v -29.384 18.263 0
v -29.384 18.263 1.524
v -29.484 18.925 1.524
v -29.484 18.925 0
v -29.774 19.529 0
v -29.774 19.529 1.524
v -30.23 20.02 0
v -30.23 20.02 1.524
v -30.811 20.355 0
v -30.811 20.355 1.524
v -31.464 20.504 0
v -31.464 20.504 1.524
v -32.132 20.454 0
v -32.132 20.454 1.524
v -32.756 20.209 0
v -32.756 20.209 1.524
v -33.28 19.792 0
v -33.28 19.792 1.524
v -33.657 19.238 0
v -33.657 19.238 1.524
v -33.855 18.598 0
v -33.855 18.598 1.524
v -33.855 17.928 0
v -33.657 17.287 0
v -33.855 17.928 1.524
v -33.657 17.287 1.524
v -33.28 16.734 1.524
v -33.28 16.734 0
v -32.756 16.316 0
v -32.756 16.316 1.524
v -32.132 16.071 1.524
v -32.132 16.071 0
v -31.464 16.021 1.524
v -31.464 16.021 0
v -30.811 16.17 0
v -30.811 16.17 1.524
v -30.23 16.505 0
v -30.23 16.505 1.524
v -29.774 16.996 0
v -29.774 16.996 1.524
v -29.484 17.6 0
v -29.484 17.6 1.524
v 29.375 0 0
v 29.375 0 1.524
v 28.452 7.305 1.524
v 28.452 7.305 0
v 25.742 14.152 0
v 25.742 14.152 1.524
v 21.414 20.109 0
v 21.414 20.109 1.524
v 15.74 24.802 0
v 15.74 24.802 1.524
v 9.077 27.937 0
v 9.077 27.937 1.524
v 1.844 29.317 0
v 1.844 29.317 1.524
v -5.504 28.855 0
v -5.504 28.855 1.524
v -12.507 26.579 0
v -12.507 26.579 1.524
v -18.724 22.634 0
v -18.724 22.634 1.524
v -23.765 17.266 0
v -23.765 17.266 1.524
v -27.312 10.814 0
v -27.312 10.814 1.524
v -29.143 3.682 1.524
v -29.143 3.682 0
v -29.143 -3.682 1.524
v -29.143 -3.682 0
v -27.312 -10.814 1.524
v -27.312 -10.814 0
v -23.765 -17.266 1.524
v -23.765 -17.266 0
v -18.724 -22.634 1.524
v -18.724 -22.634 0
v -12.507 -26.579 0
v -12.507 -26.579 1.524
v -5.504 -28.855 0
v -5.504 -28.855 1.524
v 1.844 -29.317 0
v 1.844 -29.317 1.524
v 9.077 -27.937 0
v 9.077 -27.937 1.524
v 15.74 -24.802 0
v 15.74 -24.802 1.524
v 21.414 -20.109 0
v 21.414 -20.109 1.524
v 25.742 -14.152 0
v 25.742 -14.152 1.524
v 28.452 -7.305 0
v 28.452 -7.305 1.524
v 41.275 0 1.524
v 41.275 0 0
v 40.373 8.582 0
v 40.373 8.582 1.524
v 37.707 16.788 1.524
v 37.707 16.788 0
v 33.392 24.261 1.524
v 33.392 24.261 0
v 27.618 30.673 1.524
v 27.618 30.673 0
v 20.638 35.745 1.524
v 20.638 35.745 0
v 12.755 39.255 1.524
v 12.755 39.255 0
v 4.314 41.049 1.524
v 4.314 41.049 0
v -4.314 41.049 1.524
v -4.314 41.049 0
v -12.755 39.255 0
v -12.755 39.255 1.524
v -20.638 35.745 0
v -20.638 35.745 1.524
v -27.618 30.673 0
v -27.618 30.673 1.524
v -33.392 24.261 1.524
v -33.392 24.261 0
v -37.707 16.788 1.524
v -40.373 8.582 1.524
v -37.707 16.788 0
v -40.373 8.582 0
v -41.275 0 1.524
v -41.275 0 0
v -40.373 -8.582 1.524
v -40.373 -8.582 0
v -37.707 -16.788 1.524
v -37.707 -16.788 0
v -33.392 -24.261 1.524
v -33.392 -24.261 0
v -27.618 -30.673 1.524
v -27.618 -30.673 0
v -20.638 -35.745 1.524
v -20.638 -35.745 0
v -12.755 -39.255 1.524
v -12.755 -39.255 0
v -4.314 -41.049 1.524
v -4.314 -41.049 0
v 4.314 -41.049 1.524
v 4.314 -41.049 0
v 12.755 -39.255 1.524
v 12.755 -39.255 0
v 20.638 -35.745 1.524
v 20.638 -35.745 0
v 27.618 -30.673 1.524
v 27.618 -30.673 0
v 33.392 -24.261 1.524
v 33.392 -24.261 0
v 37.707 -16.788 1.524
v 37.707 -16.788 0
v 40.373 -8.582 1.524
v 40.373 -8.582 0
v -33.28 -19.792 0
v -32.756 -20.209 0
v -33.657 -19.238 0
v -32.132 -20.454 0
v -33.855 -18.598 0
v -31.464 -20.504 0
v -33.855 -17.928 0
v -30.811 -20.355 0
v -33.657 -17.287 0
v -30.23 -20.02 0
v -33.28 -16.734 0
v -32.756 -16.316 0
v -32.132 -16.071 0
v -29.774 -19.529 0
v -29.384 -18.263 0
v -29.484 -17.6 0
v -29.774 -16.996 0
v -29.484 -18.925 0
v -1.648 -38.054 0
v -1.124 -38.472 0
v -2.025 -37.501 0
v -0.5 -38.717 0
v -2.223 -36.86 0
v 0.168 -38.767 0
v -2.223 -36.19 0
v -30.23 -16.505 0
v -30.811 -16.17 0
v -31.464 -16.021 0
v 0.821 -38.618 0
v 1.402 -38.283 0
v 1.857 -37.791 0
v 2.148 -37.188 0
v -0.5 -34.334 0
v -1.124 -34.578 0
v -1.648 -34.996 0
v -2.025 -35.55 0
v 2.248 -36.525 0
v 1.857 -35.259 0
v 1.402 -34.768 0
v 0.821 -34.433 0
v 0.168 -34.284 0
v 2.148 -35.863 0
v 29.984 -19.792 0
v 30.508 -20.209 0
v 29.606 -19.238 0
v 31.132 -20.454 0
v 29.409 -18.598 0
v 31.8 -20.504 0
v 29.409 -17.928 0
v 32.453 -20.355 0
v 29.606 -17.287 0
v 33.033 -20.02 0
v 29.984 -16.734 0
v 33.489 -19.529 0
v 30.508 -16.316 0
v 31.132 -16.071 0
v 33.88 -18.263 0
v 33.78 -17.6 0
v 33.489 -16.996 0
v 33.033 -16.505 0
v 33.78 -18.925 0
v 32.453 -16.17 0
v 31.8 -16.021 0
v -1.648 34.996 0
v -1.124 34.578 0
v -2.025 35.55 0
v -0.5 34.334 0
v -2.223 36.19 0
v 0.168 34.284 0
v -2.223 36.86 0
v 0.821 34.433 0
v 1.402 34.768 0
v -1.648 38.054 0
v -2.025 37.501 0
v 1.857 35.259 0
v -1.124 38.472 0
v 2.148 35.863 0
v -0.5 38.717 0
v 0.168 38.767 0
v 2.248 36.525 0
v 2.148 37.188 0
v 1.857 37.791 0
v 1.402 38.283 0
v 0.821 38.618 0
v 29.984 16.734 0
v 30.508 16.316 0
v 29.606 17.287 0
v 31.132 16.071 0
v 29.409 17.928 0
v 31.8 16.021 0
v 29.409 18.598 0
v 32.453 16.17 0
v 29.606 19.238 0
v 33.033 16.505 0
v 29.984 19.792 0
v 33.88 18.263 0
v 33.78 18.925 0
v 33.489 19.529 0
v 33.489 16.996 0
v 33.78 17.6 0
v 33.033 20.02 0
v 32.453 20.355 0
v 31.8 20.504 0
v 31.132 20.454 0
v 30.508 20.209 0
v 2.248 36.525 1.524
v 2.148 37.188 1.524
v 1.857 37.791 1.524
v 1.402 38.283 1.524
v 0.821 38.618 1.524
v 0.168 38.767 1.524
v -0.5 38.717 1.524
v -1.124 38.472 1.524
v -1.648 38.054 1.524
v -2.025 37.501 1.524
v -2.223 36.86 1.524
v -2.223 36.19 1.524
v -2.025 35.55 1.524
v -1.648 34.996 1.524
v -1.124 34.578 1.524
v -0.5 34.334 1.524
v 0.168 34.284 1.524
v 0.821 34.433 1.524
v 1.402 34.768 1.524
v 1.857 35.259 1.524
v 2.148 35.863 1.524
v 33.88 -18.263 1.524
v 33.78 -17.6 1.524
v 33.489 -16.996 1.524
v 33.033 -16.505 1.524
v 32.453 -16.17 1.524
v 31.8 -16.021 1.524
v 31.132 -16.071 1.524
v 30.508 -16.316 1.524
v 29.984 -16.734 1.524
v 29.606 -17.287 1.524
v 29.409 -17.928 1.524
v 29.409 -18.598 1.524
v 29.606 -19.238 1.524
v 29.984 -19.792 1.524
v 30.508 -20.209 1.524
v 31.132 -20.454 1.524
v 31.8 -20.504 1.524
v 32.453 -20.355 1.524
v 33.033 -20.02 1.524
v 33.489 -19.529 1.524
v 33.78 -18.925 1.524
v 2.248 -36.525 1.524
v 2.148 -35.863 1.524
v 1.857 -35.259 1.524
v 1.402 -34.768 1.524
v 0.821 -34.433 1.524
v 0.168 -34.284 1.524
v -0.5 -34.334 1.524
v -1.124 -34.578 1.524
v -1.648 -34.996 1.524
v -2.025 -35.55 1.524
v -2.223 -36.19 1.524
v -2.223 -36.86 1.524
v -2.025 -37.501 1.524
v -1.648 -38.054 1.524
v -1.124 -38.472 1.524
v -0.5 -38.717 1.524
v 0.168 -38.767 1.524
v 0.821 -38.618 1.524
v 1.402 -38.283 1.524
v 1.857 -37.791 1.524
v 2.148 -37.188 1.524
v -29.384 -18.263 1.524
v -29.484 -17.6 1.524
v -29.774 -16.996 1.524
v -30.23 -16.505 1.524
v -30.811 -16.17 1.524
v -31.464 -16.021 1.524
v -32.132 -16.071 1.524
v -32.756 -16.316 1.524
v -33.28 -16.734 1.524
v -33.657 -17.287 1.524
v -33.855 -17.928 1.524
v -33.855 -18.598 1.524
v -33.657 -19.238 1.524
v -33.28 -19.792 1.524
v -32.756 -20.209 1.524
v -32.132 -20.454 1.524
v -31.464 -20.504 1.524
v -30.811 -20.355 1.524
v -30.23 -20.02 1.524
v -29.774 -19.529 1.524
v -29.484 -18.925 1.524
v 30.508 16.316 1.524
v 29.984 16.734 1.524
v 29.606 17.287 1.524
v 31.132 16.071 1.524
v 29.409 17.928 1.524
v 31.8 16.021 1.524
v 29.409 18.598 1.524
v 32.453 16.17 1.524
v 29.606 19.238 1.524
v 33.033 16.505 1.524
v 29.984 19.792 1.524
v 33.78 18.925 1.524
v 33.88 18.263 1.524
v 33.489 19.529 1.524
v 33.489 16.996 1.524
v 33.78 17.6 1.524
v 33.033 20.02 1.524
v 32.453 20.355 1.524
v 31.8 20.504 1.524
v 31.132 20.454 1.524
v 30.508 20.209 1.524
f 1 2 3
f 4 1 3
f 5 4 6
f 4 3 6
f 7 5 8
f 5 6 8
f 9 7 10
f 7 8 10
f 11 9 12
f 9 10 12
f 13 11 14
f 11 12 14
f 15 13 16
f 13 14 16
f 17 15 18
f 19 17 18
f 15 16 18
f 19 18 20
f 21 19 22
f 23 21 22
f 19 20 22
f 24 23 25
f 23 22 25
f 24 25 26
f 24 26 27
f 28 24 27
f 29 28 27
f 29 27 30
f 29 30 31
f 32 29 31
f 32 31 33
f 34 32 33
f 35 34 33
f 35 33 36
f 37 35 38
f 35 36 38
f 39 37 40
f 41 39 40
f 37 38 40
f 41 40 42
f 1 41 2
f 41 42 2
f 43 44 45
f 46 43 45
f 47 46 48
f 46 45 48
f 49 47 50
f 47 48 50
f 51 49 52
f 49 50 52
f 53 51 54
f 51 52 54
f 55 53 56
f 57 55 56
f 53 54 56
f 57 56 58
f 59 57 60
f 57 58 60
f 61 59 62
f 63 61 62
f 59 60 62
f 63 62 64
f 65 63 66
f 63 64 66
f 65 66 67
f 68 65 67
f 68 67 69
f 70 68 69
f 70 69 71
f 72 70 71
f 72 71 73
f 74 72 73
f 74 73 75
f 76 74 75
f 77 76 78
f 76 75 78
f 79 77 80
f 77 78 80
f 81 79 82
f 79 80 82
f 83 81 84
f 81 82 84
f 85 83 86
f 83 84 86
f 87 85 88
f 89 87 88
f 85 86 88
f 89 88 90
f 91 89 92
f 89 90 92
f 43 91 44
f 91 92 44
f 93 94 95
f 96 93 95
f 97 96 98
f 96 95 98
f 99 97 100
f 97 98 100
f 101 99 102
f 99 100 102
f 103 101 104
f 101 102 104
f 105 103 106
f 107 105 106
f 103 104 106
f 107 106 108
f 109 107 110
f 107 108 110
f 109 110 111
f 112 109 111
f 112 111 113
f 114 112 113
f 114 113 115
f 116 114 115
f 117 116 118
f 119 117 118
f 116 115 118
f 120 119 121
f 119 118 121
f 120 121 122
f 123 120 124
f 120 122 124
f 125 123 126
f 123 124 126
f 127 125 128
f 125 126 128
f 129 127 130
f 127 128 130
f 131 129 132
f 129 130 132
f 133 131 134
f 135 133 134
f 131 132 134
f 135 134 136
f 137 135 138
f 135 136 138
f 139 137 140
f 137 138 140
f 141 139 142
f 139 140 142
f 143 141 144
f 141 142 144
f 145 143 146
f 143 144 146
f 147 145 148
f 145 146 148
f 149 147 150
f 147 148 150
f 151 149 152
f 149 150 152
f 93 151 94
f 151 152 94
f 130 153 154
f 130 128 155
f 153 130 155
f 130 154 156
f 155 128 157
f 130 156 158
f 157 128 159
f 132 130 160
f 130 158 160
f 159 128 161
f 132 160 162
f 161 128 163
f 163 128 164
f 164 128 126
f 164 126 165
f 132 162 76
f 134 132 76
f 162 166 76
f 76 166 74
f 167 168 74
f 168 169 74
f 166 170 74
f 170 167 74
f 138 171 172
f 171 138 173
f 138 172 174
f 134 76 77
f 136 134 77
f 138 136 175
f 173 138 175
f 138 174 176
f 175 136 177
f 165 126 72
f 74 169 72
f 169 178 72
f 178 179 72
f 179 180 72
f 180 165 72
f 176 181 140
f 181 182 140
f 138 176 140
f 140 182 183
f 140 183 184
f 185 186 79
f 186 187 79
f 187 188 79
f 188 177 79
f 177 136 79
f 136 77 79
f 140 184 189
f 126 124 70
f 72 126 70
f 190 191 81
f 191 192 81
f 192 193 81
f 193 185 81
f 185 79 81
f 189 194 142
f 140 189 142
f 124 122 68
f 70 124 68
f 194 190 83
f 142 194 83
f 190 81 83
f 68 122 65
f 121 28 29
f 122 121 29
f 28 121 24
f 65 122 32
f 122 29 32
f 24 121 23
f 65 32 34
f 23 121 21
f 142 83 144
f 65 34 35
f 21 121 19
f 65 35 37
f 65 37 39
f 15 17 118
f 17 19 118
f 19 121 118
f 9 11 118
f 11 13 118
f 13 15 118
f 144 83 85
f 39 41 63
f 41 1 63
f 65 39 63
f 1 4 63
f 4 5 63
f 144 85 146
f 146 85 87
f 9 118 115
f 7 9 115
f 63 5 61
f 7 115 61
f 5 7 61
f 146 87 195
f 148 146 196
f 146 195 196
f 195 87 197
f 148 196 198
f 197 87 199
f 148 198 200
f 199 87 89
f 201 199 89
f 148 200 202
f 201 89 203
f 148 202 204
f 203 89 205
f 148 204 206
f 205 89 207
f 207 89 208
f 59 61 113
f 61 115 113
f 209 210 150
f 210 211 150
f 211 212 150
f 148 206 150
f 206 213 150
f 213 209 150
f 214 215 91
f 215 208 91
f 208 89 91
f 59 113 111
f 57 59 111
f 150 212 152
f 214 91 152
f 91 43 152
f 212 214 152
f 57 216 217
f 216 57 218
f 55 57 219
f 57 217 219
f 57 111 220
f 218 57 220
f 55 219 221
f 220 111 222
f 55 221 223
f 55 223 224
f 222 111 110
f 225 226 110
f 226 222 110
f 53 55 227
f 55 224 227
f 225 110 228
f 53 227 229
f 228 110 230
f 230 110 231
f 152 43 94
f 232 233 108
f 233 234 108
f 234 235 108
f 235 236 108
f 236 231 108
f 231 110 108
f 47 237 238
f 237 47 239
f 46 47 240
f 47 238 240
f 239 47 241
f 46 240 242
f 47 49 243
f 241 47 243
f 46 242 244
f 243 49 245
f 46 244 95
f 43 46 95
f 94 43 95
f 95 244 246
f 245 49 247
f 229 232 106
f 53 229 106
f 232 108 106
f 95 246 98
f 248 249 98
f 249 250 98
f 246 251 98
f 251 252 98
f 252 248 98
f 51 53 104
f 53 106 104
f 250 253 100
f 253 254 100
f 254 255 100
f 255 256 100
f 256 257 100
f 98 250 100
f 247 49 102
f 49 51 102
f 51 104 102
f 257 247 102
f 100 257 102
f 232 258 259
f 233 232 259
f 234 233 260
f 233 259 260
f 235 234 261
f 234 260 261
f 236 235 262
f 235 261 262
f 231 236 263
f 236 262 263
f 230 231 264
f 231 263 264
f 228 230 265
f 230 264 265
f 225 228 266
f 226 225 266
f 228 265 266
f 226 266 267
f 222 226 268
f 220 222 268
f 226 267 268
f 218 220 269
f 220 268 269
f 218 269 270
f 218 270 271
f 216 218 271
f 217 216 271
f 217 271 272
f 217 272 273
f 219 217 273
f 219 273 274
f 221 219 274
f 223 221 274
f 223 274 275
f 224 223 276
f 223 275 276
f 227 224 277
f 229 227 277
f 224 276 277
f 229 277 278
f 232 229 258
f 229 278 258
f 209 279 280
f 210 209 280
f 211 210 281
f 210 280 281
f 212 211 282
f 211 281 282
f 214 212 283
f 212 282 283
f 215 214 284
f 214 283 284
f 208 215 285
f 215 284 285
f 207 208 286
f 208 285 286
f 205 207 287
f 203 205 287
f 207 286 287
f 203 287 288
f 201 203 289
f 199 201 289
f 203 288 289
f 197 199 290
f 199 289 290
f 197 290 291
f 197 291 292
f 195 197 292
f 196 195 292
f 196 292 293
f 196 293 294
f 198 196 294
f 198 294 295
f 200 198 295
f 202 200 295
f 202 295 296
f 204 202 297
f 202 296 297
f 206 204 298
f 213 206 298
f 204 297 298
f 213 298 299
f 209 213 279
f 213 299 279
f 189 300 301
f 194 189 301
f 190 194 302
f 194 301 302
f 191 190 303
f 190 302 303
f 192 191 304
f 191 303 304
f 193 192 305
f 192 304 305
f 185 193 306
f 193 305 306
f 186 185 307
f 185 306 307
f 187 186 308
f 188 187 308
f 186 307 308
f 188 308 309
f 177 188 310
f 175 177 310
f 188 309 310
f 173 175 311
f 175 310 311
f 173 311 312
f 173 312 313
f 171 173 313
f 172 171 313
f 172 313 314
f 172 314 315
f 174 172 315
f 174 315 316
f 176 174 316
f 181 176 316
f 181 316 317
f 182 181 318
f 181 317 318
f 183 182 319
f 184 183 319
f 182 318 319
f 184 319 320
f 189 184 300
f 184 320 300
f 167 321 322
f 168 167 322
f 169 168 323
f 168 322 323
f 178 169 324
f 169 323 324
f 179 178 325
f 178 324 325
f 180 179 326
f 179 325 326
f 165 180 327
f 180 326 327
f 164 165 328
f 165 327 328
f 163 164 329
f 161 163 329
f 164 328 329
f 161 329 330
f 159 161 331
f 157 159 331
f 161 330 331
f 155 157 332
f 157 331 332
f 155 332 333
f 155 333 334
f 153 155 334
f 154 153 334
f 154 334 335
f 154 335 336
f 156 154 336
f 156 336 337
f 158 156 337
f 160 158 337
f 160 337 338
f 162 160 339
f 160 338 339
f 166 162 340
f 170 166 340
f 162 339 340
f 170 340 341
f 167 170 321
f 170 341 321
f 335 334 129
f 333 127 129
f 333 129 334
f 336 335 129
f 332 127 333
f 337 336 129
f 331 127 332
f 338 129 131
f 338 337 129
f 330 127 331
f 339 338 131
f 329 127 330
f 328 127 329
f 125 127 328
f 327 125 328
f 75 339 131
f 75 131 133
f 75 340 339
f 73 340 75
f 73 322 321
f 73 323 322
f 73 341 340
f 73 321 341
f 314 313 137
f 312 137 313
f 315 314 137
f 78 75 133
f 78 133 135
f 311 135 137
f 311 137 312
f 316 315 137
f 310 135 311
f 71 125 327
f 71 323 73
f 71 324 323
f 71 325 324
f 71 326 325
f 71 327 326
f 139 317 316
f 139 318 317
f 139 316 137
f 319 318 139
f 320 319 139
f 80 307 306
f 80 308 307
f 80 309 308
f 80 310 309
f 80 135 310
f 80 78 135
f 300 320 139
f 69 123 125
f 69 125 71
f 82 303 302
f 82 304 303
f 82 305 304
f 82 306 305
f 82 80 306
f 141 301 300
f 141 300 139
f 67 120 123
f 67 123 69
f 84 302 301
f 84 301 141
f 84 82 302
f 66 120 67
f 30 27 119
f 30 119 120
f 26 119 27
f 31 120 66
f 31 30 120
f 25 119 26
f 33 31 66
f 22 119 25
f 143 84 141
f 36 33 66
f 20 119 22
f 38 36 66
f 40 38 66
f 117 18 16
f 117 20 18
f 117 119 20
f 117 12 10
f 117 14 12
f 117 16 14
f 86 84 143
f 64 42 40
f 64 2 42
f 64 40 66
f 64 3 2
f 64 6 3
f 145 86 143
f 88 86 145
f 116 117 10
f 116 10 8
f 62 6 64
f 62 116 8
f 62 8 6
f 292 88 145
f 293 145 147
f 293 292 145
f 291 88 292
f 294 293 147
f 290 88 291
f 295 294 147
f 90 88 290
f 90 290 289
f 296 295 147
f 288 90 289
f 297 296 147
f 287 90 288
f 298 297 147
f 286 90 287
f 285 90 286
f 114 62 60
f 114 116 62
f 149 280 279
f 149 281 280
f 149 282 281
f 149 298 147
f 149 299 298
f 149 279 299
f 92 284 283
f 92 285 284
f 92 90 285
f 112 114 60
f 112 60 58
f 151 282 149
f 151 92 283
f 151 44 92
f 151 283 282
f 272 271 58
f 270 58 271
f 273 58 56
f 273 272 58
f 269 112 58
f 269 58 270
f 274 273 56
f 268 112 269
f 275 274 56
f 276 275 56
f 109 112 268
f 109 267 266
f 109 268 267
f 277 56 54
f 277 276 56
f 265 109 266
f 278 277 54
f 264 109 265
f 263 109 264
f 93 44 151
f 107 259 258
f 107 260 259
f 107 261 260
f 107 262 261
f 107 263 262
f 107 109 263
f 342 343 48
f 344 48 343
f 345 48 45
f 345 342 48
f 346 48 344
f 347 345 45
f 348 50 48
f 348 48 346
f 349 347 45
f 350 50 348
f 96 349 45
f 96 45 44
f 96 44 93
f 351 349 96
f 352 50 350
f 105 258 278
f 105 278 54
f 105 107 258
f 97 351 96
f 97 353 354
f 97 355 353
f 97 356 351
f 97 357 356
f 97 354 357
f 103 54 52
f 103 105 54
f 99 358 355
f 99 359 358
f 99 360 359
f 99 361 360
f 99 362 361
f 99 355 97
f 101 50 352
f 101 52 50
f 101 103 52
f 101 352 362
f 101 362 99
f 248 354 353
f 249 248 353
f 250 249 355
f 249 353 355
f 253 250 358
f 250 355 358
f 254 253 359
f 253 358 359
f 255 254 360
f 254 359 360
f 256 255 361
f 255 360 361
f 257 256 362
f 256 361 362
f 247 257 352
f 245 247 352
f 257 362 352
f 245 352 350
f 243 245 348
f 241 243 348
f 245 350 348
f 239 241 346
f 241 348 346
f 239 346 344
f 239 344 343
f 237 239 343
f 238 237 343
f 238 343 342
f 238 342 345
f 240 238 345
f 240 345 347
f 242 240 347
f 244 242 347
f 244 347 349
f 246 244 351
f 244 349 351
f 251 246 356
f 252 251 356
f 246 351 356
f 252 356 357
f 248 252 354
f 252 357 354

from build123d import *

# Parameters (mm, degrees)
F0_R     = 41.275
F1_DEPTH = 1.524
F2_R     = 2.2479
F3_DEPTH = 1.524
F4_R     = 29.3751
F5_DEPTH = 1.524


with BuildPart() as f1:
    # F0 (on Top) → F1 (new body)
    with BuildSketch(Plane.XY):
        Circle(F0_R)
    extrude(amount=F1_DEPTH)

    # F2 (on face) → F3 (cut, through all)
    with BuildSketch(Plane.XY.offset(1.524)):
        with Locations((0, 36.5252)):
            Circle(F2_R)
        with Locations((-31.631751, 18.2626)):
            Circle(F2_R)
        with Locations((-31.631751, -18.2626)):
            Circle(F2_R)
        with Locations((0, -36.5252)):
            Circle(F2_R)
        with Locations((31.631751, -18.2626)):
            Circle(F2_R)
        with Locations((31.631751, 18.2626)):
            Circle(F2_R)
    extrude(amount=-F3_DEPTH, mode=Mode.SUBTRACT)

    # F4 (on face) → F5 (cut, through all)
    with BuildSketch(Plane.XY.offset(1.524)):
        Circle(F4_R)
    extrude(amount=-F5_DEPTH, mode=Mode.SUBTRACT)


solid = f1.part
